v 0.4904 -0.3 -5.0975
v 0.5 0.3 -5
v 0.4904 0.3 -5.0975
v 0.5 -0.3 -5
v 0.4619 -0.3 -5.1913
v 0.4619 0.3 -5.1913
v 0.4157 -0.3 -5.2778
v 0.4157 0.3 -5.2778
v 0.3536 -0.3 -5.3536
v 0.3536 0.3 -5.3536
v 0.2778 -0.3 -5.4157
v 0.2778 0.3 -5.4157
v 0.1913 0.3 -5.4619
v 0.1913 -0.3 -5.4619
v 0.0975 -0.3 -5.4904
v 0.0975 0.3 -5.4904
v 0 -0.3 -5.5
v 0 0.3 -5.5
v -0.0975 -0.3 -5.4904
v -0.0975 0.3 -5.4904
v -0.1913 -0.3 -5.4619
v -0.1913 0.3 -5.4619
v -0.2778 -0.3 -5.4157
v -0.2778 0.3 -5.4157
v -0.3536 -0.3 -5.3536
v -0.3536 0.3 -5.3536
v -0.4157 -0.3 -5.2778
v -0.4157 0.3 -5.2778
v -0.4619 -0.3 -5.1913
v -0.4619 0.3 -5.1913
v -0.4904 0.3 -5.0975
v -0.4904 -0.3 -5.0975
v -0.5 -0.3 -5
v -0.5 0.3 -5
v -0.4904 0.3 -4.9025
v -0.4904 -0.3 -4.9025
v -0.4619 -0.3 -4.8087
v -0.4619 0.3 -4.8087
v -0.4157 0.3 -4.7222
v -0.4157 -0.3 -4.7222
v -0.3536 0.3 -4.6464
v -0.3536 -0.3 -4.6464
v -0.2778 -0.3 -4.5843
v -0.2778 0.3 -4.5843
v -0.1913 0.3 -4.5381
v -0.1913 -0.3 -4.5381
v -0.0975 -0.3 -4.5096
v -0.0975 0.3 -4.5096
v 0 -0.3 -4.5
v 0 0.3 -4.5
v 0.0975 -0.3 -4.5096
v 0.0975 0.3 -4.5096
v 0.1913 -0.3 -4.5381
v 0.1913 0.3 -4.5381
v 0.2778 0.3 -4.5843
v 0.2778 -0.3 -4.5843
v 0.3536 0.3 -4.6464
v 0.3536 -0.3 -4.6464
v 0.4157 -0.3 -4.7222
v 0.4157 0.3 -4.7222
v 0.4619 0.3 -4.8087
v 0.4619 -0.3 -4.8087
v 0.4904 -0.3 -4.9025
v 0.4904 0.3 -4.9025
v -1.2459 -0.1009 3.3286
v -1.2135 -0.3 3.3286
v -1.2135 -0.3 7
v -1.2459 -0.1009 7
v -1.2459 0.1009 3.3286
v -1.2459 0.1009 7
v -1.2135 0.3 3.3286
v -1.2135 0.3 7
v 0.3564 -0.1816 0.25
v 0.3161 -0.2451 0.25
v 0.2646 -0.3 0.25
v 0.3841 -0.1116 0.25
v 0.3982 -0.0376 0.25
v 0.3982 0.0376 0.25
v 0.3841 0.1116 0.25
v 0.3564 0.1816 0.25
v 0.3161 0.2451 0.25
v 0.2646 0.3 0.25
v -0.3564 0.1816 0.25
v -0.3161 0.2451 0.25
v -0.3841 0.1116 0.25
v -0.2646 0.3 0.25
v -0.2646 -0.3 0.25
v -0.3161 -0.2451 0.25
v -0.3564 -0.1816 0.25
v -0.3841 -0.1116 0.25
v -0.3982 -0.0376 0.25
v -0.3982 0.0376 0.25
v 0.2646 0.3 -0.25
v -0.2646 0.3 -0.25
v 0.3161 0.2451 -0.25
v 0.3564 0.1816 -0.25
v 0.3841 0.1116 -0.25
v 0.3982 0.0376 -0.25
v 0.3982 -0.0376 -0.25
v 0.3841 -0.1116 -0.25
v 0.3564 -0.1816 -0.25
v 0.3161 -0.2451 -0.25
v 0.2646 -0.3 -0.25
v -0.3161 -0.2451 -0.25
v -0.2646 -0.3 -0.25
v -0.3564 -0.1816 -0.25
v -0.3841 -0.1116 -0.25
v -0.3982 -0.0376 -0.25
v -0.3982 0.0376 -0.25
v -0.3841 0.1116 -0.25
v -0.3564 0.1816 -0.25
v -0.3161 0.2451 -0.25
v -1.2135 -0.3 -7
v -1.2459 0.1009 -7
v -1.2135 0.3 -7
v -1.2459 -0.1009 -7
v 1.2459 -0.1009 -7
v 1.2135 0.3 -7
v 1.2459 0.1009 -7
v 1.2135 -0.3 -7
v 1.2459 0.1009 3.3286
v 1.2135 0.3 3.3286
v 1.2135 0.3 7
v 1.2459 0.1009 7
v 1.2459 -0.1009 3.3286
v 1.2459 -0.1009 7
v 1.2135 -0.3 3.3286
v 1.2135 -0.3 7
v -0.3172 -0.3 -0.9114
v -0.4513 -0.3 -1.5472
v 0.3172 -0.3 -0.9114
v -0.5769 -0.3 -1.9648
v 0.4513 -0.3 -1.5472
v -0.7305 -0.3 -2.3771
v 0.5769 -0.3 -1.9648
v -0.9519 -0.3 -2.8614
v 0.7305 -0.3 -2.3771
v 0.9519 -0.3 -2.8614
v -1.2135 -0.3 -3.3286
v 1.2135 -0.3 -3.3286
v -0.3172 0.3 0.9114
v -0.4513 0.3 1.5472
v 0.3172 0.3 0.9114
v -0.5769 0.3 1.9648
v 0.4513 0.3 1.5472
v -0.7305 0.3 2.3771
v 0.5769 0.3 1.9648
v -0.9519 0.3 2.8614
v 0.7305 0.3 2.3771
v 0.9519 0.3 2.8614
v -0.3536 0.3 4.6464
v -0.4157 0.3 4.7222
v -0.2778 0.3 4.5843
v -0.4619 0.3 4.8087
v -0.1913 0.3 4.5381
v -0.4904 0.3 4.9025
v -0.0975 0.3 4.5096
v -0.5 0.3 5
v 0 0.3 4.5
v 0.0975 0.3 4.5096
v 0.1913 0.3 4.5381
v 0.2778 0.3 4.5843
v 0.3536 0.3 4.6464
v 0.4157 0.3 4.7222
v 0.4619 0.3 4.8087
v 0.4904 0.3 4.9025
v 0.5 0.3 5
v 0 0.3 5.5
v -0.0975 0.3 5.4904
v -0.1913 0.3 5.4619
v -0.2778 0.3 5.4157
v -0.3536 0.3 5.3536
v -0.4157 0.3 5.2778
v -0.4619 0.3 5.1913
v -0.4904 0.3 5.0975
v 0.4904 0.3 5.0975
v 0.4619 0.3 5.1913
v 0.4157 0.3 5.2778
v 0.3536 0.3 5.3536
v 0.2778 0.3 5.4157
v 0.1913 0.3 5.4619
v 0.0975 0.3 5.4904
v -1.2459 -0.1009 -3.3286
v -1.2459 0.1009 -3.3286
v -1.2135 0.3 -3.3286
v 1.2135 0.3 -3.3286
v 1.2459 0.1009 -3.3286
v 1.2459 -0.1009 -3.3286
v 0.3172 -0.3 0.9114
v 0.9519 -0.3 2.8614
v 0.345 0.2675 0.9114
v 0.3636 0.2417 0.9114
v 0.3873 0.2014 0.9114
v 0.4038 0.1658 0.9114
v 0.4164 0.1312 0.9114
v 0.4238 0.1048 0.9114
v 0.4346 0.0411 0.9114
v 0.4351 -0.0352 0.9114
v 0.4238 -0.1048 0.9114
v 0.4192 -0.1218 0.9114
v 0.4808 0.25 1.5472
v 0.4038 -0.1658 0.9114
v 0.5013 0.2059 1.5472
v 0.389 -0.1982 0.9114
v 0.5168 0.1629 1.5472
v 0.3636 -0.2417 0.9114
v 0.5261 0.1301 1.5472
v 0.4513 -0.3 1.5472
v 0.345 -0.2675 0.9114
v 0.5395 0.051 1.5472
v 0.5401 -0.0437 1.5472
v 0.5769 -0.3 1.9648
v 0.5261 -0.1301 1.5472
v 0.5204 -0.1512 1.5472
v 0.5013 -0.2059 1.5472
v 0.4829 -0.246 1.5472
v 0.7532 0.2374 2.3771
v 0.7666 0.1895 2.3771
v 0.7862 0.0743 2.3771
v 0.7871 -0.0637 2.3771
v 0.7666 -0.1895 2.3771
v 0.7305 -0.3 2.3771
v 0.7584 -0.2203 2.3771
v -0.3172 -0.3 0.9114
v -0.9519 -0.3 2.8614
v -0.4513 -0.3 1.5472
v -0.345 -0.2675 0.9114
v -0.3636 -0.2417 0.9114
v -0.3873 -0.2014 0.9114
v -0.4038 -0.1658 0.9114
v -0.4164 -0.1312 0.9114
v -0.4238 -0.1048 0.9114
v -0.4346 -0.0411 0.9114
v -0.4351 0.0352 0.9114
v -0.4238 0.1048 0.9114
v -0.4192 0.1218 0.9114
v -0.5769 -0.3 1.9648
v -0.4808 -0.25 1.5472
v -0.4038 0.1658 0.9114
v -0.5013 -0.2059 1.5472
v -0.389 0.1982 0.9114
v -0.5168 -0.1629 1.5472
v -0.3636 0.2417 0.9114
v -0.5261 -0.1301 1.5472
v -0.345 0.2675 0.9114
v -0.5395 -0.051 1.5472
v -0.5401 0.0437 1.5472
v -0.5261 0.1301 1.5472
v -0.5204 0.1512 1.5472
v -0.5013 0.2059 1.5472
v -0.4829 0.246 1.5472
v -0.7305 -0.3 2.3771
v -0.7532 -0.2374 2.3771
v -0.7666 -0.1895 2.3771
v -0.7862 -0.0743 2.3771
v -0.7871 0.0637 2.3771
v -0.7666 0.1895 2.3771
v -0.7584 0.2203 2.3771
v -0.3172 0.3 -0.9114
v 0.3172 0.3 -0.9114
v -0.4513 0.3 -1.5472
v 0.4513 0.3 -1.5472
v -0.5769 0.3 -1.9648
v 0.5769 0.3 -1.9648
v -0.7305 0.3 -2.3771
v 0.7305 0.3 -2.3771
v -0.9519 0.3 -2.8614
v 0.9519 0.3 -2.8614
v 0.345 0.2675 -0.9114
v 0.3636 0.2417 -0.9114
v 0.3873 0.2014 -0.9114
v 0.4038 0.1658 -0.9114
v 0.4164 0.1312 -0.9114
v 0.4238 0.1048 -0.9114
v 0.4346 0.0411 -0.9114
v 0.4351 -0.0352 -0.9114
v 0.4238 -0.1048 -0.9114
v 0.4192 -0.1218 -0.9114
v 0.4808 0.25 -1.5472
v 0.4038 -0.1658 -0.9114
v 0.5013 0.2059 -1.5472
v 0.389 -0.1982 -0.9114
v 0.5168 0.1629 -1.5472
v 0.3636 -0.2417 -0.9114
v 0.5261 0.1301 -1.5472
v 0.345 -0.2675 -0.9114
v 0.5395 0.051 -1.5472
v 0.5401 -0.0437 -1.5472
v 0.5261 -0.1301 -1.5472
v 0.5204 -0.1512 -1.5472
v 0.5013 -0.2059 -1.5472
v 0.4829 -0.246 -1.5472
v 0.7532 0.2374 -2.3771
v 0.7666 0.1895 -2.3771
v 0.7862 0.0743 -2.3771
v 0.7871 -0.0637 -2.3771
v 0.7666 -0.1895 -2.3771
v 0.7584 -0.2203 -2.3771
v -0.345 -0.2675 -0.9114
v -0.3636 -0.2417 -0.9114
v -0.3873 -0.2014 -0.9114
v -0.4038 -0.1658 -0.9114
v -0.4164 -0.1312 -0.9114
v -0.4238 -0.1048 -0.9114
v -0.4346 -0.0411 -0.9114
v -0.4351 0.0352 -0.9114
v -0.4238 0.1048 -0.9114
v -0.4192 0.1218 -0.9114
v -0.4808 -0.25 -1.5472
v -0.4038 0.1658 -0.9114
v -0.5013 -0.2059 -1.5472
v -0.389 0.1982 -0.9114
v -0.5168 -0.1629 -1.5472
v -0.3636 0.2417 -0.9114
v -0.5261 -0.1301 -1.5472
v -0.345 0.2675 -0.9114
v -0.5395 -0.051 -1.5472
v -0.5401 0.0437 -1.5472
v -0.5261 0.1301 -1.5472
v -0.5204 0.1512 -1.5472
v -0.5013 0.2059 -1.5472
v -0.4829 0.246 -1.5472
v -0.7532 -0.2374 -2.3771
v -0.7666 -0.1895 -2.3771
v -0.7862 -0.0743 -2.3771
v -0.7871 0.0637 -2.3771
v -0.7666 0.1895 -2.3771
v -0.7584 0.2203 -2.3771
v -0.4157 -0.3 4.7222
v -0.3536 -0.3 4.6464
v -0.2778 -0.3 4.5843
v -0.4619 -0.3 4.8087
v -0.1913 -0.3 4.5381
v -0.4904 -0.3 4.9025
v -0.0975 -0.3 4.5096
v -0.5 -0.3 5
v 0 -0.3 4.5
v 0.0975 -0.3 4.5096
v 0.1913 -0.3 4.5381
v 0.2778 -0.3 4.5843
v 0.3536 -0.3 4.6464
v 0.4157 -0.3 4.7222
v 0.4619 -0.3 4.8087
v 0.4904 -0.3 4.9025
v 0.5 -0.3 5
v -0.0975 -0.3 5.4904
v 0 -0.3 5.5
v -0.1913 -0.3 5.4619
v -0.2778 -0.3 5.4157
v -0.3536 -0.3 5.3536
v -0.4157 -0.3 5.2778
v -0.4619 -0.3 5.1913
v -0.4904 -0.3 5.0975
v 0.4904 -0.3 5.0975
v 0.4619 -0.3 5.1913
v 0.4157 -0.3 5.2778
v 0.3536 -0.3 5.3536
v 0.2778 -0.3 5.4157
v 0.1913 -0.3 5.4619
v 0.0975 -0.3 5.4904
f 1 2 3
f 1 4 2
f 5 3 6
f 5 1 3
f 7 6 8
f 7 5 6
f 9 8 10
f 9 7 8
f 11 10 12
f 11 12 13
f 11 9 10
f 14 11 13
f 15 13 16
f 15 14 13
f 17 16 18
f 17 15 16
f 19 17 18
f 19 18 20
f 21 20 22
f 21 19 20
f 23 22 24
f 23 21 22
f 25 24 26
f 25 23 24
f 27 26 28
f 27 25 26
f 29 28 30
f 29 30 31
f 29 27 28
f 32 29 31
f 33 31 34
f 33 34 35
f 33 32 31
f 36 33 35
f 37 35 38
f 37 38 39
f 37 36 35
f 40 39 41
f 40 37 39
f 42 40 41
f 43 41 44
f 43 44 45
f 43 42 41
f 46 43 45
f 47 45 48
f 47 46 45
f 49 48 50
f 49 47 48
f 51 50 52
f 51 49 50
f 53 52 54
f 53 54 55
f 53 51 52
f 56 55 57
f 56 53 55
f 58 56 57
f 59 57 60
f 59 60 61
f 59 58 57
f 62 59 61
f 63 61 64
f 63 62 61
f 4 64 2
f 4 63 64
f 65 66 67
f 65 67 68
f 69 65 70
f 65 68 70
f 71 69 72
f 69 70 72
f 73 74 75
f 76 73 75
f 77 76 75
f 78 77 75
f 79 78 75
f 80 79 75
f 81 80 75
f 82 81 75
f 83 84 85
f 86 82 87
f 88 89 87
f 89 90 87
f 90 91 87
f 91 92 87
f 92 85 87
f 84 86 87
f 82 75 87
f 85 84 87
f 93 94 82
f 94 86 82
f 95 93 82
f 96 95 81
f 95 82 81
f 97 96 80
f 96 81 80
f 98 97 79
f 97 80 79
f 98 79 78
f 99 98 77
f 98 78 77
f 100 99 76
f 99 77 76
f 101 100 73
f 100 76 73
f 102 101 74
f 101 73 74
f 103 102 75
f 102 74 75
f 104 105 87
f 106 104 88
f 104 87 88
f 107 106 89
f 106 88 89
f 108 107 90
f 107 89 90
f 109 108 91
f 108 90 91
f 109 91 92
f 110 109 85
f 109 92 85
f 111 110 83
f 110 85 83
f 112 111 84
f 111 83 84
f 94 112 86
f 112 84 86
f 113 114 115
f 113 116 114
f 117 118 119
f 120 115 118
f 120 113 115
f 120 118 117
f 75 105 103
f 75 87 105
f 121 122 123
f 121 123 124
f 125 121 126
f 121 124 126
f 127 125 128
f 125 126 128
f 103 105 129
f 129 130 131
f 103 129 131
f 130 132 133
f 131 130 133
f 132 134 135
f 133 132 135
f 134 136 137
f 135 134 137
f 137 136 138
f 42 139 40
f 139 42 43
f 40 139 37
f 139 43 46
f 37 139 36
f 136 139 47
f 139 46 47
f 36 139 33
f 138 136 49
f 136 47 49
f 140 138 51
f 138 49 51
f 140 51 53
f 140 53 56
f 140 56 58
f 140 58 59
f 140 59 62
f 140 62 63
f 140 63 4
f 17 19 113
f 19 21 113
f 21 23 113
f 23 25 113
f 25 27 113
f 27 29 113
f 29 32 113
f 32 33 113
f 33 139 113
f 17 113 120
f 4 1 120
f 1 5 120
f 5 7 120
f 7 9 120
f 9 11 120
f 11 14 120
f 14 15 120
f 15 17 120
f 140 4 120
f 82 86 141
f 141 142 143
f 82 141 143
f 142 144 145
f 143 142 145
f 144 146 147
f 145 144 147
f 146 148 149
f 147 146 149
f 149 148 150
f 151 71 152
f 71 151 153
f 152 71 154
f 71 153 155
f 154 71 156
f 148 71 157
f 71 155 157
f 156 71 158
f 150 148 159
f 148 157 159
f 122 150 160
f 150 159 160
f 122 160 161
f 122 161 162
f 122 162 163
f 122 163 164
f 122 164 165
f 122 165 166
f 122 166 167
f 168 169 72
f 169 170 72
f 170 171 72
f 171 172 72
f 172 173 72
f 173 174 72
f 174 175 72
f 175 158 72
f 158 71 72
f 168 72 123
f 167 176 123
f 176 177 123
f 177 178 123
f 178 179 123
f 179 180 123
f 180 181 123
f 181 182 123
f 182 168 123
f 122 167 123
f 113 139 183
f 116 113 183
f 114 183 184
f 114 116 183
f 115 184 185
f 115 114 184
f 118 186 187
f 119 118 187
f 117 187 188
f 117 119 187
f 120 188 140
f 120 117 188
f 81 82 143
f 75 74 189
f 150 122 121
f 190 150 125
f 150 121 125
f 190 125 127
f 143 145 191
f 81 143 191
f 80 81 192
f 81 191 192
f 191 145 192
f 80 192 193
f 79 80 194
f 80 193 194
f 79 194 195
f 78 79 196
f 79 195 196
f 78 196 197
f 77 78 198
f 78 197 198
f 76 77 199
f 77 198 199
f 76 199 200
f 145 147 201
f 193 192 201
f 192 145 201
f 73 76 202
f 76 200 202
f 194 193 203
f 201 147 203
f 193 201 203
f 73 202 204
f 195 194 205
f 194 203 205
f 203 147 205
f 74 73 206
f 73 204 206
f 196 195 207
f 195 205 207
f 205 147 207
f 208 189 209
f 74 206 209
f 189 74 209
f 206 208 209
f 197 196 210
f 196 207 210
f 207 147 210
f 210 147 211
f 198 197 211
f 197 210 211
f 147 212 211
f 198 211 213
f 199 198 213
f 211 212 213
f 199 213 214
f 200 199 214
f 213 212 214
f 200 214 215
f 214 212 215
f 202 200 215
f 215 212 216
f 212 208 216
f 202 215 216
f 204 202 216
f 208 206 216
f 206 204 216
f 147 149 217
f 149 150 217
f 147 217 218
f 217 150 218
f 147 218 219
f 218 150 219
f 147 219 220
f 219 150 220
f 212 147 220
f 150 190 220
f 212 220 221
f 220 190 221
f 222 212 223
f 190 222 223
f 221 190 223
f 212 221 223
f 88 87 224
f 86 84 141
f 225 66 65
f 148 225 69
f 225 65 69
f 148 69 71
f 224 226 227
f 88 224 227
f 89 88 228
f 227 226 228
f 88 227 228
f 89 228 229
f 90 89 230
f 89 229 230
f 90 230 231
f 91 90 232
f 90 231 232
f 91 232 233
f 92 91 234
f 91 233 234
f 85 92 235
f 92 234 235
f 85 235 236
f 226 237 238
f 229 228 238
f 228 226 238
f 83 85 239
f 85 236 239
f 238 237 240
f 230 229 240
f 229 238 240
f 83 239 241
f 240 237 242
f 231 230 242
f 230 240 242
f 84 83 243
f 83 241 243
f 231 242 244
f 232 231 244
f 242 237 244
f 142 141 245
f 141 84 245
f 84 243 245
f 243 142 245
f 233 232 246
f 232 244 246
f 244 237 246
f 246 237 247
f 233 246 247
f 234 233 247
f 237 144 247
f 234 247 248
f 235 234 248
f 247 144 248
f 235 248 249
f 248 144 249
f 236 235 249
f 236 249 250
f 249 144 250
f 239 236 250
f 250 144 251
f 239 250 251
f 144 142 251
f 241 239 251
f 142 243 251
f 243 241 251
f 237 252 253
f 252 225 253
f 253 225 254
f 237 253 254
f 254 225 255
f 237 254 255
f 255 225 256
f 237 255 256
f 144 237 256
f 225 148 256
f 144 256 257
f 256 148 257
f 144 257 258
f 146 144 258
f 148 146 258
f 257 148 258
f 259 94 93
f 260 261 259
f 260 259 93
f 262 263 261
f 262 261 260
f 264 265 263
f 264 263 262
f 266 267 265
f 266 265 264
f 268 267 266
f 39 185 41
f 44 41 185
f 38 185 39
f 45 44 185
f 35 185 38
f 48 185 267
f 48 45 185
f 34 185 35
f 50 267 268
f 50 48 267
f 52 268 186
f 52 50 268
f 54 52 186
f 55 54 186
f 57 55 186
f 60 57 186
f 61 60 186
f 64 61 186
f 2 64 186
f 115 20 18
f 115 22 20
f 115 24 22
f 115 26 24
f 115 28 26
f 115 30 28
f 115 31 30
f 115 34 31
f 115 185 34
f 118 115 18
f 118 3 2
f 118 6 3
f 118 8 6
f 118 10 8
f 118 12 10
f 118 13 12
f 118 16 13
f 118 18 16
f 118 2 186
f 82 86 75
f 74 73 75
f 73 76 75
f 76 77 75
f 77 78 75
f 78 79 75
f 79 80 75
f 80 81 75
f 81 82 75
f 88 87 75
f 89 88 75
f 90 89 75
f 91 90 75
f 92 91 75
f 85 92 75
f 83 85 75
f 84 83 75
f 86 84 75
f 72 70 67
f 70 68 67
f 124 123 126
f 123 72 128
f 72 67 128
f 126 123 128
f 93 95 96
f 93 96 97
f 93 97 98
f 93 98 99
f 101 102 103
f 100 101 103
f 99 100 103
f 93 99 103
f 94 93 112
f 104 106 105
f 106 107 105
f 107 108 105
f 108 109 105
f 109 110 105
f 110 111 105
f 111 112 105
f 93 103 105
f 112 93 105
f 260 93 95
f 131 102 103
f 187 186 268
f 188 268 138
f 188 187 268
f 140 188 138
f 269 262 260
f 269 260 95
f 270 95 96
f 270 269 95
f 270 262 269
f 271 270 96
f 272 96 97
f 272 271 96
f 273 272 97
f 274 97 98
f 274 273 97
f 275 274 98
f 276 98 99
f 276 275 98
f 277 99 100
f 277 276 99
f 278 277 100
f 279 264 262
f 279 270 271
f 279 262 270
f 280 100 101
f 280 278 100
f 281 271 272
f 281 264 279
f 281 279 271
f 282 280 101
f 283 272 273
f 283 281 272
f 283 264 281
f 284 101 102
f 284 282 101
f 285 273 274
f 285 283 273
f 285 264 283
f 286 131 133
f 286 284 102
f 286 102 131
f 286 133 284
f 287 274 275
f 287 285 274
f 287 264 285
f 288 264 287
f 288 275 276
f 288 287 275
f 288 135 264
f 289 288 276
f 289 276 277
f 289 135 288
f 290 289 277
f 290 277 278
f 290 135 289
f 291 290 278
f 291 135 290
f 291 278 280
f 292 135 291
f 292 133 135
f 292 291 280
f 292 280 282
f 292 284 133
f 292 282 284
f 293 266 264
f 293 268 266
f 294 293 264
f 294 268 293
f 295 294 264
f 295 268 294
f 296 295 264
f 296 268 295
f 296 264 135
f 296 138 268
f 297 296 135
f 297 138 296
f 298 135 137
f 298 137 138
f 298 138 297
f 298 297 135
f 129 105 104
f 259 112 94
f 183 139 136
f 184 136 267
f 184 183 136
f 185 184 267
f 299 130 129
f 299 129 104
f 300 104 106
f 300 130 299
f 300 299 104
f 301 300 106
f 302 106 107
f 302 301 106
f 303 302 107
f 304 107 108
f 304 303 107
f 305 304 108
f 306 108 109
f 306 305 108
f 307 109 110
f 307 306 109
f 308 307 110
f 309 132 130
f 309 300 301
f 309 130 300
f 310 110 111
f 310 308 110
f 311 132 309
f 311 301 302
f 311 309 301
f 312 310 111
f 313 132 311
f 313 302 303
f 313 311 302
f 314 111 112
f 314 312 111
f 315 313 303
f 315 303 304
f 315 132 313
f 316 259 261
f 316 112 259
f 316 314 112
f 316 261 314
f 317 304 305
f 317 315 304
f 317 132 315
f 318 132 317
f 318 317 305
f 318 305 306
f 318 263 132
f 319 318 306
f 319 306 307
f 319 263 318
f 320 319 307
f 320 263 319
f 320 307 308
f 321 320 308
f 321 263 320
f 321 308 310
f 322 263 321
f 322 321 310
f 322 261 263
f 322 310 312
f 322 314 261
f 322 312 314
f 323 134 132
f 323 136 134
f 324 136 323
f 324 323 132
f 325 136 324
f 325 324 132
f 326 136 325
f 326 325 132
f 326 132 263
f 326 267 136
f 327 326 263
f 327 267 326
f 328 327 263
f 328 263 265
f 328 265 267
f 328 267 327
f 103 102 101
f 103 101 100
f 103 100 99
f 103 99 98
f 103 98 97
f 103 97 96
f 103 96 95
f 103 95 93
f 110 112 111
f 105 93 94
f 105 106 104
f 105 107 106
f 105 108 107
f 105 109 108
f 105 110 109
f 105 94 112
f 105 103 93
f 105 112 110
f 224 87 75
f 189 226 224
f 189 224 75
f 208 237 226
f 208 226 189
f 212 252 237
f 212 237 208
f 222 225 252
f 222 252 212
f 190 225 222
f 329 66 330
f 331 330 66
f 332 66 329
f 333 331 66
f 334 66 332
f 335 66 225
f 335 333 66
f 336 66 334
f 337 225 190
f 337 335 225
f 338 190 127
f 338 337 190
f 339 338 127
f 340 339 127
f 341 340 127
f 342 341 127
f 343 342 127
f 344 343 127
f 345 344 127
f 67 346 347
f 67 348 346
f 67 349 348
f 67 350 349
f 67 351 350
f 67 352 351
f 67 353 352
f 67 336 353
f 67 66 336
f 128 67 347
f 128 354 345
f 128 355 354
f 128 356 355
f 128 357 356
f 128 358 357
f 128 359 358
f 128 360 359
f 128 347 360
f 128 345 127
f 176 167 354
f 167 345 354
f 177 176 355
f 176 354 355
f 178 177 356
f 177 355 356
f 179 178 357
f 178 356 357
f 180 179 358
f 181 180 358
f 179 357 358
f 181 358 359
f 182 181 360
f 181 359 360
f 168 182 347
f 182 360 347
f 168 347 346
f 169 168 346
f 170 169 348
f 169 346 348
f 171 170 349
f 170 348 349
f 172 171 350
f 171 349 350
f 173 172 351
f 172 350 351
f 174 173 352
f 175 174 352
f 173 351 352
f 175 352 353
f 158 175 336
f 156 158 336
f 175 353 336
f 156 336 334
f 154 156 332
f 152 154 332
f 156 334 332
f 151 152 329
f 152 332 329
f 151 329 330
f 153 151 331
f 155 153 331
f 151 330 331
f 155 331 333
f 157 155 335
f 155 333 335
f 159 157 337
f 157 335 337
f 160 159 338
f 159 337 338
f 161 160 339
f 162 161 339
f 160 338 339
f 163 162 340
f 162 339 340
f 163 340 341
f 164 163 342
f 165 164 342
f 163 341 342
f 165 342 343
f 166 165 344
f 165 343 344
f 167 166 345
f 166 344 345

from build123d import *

# Parameters (mm, degrees)
F4_DEPTH = 0.3
F5_R     = 0.5
F6_DEPTH = 12.5


# Not quite as in the source:
# - a feature names something its author has since deleted; it is built from what else it names


with BuildPart() as f1:
    # F0 (on Front) → F1 (revolve)
    with BuildSketch(Plane.XZ):
        with BuildLine():
            Line((1.25, 7), (0, 7))
            Line((0, 7), (0, 0.25))
            Line((0, 0.25), (0.4, 0.25))
            ThreePointArc((0.4, 0.25), (0.6164025036, 1.8468719423), (1.25, 3.3285548558))
            Line((1.25, 3.3285548558), (1.25, 7))
        make_face()
    revolve(axis=Axis((0, 0, 3.5), (0, 0, -1)))


with BuildPart() as f2:
    # F0 (on Front) → F2 (revolve)
    with BuildSketch(Plane.XZ):
        Polygon((0.4, 0.25), (0, 0.25), (0, 0), (0, -0.25), (0.4, -0.25), align=None)
    revolve(axis=Axis((0, 0, 3.5), (0, 0, -1)))


with BuildPart() as f4_tool:
    # F3 (on Front) → F4 (new body, symmetric)
    with BuildSketch(Plane.XZ):
        Polygon((1.25, 0.25), (1.25, 7.75), (0, 7.75), (-1.25, 7.75), (-1.25, 0.25), (-1.25, -0.25), (0, -0.25), (1.25, -0.25), align=None)
    extrude(amount=F4_DEPTH, both=True)


with BuildPart() as f1_1:
    add(f1.part)

    # F4: intersect by f4_tool
    add(f4_tool.part, mode=Mode.INTERSECT)

    # F5 (on Front) → F6 (cut, symmetric)
    with BuildSketch(Plane.XZ):
        with Locations((0, 5)):
            Circle(F5_R)
    extrude(amount=F6_DEPTH, both=True, mode=Mode.SUBTRACT)


with BuildPart() as f2_1:
    add(f2.part)

    # F4: intersect by f4_tool
    add(f4_tool.part, mode=Mode.INTERSECT)


with BuildPart() as f7_1:
    # F7: instance of F1
    add(f1_1.part.mirror(Plane.XY))


solid = Compound([f1_1.part, f2_1.part, f7_1.part])
